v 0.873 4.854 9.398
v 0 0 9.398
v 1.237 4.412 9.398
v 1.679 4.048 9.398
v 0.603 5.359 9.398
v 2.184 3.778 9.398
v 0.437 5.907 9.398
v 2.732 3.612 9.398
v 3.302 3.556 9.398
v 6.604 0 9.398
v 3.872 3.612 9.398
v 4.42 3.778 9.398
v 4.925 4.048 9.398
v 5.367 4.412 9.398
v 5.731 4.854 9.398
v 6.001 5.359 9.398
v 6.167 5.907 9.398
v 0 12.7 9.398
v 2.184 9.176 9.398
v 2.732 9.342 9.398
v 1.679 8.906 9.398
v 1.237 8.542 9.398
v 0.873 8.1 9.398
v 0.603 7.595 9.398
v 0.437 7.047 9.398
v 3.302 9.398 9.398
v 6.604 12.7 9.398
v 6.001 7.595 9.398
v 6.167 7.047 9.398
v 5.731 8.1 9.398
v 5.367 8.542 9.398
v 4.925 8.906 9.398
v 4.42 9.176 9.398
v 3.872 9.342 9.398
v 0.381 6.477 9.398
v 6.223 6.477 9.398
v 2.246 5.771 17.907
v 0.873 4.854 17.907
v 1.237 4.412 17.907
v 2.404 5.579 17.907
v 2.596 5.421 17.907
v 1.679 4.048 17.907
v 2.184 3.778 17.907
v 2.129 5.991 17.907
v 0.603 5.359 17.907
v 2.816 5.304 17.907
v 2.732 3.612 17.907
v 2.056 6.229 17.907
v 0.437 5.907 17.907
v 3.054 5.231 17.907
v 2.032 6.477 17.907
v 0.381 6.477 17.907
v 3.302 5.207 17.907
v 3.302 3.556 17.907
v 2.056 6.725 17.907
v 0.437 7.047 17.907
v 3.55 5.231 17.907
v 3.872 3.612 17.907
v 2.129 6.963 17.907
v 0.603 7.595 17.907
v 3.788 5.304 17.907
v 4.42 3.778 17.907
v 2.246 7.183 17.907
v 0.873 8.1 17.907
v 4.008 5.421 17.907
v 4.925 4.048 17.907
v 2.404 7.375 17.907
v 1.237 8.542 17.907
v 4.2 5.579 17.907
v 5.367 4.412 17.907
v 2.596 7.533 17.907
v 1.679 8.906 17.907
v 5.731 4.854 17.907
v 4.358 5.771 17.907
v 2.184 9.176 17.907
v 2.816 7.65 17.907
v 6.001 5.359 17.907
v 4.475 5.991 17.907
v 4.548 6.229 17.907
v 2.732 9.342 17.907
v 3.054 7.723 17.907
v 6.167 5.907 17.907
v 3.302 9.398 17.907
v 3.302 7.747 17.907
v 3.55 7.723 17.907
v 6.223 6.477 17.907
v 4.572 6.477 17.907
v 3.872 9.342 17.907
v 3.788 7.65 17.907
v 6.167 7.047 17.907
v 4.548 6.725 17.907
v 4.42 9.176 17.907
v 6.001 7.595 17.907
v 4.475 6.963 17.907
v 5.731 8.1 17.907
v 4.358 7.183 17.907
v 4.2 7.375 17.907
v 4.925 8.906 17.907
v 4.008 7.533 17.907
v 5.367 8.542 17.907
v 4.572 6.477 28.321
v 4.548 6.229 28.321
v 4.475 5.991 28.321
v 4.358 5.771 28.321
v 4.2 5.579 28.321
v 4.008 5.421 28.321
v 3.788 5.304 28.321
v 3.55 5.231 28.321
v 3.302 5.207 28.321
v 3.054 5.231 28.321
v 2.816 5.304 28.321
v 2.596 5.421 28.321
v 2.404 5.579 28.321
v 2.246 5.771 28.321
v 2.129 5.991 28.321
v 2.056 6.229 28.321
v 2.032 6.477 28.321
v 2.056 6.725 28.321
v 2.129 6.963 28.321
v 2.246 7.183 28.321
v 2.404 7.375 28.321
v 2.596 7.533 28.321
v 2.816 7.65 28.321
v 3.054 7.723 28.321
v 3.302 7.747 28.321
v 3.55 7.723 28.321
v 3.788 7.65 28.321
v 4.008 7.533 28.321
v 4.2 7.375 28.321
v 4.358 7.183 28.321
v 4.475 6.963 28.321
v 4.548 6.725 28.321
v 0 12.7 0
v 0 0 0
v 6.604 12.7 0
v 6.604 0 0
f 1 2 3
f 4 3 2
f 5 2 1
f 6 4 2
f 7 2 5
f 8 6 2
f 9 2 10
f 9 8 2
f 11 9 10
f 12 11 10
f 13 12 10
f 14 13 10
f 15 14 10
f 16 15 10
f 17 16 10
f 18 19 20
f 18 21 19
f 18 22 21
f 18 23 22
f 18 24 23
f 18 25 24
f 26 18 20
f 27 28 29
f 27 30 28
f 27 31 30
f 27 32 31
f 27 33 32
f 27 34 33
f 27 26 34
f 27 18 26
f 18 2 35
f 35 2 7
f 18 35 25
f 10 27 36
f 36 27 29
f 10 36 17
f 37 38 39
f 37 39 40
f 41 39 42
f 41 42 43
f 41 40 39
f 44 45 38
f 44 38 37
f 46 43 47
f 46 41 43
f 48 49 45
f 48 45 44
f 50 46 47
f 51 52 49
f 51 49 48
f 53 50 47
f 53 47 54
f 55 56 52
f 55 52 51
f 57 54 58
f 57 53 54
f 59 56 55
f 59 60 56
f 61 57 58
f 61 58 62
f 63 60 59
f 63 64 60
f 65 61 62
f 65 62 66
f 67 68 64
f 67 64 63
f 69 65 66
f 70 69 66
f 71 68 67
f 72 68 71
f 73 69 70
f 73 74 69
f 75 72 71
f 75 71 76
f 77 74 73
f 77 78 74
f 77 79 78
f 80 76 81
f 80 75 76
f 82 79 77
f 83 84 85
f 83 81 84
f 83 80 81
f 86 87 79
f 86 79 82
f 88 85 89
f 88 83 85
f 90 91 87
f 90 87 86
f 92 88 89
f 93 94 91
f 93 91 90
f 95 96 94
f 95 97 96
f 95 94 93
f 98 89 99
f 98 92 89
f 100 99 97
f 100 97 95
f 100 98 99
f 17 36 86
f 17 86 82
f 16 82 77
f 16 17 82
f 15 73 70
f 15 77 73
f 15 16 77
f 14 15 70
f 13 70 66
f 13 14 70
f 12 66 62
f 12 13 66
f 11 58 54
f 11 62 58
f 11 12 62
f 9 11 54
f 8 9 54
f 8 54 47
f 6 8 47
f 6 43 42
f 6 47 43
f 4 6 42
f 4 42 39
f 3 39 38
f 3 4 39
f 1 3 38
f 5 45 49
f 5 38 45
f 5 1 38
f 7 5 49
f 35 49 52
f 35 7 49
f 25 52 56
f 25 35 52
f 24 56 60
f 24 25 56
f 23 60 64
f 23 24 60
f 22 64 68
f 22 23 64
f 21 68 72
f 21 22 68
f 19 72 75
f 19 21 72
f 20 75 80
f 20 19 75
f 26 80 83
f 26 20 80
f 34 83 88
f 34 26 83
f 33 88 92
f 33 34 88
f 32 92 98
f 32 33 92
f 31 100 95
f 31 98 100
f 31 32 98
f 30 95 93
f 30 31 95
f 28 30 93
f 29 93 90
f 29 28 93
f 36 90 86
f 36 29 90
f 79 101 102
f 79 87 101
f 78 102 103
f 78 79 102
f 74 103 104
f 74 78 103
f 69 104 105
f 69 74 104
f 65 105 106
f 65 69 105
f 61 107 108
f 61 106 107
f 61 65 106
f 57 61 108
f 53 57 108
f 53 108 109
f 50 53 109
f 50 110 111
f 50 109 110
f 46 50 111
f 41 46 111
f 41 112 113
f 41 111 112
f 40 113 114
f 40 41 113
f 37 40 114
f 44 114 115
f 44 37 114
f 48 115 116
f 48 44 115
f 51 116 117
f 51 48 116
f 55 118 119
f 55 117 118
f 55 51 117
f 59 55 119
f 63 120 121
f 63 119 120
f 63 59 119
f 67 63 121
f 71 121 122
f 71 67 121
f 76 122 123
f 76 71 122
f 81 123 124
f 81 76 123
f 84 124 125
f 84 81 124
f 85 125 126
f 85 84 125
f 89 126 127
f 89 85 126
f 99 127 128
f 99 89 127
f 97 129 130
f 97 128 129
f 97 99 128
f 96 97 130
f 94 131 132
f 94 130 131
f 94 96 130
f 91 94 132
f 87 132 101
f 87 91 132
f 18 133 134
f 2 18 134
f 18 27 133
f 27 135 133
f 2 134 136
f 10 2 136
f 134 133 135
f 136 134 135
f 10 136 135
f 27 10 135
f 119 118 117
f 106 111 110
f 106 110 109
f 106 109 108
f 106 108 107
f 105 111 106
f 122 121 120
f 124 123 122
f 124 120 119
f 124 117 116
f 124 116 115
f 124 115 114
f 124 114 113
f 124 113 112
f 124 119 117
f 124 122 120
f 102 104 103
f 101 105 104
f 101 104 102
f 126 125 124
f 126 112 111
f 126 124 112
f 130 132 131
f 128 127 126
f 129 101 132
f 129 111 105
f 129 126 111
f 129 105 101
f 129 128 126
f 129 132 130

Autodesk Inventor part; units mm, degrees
ref_plane "YZ Plane" through (0, 0, 0) normal (1, 0, 0) x (0, 1, 0)
ref_plane "XZ Plane" through (0, 0, 0) normal (0, 1, 0) x (-1, 0, 0)
ref_plane "XY Plane" through (0, 0, 0) normal (0, 0, 1) x (1, 0, 0)
sketch "Sketch2" plane through (0, 0, 0) normal (0, 0, 1) x (1, 0, 0)
  line L0 (0, 0) -> (6.604, 0)
  line L1 (6.604, 0) -> (6.604, 12.7)
  line L2 (6.604, 12.7) -> (0, 12.7)
  line L3 (0, 12.7) -> (0, 0)
  dimension "d0" = 6.604
  dimension "d1" = 12.7
extrude "Extrusion1" add sketch "Sketch2" along normal blind 9.398
sketch "Sketch3" plane through (0, 0, 9.398) normal (0, 0, 1) x (1, 0, 0)
  line L0 (6.604, 12.7) -> (0, 12.7) projected
  line L1 (3.302, 9.398) -> (3.302, 3.556) construction
  circle A0 centre (3.302, 6.477) radius 2.921
  point P0 (0, 0)
  dimension "d5" = 5.842
extrude "Extrusion2" add sketch "Sketch3" along normal blind 8.509
sketch "Sketch4" plane through (3.302, 6.477, 17.907) normal (0, 0, 1) x (1, 0, 0)
  circle A0 centre (0, 0) radius 1.27
  point P0 (-3.302, -6.477)
  dimension "d8" = 2.54
extrude "Extrusion3" add sketch "Sketch4" along normal blind 10.414
properties part number "msheehan_switch"
